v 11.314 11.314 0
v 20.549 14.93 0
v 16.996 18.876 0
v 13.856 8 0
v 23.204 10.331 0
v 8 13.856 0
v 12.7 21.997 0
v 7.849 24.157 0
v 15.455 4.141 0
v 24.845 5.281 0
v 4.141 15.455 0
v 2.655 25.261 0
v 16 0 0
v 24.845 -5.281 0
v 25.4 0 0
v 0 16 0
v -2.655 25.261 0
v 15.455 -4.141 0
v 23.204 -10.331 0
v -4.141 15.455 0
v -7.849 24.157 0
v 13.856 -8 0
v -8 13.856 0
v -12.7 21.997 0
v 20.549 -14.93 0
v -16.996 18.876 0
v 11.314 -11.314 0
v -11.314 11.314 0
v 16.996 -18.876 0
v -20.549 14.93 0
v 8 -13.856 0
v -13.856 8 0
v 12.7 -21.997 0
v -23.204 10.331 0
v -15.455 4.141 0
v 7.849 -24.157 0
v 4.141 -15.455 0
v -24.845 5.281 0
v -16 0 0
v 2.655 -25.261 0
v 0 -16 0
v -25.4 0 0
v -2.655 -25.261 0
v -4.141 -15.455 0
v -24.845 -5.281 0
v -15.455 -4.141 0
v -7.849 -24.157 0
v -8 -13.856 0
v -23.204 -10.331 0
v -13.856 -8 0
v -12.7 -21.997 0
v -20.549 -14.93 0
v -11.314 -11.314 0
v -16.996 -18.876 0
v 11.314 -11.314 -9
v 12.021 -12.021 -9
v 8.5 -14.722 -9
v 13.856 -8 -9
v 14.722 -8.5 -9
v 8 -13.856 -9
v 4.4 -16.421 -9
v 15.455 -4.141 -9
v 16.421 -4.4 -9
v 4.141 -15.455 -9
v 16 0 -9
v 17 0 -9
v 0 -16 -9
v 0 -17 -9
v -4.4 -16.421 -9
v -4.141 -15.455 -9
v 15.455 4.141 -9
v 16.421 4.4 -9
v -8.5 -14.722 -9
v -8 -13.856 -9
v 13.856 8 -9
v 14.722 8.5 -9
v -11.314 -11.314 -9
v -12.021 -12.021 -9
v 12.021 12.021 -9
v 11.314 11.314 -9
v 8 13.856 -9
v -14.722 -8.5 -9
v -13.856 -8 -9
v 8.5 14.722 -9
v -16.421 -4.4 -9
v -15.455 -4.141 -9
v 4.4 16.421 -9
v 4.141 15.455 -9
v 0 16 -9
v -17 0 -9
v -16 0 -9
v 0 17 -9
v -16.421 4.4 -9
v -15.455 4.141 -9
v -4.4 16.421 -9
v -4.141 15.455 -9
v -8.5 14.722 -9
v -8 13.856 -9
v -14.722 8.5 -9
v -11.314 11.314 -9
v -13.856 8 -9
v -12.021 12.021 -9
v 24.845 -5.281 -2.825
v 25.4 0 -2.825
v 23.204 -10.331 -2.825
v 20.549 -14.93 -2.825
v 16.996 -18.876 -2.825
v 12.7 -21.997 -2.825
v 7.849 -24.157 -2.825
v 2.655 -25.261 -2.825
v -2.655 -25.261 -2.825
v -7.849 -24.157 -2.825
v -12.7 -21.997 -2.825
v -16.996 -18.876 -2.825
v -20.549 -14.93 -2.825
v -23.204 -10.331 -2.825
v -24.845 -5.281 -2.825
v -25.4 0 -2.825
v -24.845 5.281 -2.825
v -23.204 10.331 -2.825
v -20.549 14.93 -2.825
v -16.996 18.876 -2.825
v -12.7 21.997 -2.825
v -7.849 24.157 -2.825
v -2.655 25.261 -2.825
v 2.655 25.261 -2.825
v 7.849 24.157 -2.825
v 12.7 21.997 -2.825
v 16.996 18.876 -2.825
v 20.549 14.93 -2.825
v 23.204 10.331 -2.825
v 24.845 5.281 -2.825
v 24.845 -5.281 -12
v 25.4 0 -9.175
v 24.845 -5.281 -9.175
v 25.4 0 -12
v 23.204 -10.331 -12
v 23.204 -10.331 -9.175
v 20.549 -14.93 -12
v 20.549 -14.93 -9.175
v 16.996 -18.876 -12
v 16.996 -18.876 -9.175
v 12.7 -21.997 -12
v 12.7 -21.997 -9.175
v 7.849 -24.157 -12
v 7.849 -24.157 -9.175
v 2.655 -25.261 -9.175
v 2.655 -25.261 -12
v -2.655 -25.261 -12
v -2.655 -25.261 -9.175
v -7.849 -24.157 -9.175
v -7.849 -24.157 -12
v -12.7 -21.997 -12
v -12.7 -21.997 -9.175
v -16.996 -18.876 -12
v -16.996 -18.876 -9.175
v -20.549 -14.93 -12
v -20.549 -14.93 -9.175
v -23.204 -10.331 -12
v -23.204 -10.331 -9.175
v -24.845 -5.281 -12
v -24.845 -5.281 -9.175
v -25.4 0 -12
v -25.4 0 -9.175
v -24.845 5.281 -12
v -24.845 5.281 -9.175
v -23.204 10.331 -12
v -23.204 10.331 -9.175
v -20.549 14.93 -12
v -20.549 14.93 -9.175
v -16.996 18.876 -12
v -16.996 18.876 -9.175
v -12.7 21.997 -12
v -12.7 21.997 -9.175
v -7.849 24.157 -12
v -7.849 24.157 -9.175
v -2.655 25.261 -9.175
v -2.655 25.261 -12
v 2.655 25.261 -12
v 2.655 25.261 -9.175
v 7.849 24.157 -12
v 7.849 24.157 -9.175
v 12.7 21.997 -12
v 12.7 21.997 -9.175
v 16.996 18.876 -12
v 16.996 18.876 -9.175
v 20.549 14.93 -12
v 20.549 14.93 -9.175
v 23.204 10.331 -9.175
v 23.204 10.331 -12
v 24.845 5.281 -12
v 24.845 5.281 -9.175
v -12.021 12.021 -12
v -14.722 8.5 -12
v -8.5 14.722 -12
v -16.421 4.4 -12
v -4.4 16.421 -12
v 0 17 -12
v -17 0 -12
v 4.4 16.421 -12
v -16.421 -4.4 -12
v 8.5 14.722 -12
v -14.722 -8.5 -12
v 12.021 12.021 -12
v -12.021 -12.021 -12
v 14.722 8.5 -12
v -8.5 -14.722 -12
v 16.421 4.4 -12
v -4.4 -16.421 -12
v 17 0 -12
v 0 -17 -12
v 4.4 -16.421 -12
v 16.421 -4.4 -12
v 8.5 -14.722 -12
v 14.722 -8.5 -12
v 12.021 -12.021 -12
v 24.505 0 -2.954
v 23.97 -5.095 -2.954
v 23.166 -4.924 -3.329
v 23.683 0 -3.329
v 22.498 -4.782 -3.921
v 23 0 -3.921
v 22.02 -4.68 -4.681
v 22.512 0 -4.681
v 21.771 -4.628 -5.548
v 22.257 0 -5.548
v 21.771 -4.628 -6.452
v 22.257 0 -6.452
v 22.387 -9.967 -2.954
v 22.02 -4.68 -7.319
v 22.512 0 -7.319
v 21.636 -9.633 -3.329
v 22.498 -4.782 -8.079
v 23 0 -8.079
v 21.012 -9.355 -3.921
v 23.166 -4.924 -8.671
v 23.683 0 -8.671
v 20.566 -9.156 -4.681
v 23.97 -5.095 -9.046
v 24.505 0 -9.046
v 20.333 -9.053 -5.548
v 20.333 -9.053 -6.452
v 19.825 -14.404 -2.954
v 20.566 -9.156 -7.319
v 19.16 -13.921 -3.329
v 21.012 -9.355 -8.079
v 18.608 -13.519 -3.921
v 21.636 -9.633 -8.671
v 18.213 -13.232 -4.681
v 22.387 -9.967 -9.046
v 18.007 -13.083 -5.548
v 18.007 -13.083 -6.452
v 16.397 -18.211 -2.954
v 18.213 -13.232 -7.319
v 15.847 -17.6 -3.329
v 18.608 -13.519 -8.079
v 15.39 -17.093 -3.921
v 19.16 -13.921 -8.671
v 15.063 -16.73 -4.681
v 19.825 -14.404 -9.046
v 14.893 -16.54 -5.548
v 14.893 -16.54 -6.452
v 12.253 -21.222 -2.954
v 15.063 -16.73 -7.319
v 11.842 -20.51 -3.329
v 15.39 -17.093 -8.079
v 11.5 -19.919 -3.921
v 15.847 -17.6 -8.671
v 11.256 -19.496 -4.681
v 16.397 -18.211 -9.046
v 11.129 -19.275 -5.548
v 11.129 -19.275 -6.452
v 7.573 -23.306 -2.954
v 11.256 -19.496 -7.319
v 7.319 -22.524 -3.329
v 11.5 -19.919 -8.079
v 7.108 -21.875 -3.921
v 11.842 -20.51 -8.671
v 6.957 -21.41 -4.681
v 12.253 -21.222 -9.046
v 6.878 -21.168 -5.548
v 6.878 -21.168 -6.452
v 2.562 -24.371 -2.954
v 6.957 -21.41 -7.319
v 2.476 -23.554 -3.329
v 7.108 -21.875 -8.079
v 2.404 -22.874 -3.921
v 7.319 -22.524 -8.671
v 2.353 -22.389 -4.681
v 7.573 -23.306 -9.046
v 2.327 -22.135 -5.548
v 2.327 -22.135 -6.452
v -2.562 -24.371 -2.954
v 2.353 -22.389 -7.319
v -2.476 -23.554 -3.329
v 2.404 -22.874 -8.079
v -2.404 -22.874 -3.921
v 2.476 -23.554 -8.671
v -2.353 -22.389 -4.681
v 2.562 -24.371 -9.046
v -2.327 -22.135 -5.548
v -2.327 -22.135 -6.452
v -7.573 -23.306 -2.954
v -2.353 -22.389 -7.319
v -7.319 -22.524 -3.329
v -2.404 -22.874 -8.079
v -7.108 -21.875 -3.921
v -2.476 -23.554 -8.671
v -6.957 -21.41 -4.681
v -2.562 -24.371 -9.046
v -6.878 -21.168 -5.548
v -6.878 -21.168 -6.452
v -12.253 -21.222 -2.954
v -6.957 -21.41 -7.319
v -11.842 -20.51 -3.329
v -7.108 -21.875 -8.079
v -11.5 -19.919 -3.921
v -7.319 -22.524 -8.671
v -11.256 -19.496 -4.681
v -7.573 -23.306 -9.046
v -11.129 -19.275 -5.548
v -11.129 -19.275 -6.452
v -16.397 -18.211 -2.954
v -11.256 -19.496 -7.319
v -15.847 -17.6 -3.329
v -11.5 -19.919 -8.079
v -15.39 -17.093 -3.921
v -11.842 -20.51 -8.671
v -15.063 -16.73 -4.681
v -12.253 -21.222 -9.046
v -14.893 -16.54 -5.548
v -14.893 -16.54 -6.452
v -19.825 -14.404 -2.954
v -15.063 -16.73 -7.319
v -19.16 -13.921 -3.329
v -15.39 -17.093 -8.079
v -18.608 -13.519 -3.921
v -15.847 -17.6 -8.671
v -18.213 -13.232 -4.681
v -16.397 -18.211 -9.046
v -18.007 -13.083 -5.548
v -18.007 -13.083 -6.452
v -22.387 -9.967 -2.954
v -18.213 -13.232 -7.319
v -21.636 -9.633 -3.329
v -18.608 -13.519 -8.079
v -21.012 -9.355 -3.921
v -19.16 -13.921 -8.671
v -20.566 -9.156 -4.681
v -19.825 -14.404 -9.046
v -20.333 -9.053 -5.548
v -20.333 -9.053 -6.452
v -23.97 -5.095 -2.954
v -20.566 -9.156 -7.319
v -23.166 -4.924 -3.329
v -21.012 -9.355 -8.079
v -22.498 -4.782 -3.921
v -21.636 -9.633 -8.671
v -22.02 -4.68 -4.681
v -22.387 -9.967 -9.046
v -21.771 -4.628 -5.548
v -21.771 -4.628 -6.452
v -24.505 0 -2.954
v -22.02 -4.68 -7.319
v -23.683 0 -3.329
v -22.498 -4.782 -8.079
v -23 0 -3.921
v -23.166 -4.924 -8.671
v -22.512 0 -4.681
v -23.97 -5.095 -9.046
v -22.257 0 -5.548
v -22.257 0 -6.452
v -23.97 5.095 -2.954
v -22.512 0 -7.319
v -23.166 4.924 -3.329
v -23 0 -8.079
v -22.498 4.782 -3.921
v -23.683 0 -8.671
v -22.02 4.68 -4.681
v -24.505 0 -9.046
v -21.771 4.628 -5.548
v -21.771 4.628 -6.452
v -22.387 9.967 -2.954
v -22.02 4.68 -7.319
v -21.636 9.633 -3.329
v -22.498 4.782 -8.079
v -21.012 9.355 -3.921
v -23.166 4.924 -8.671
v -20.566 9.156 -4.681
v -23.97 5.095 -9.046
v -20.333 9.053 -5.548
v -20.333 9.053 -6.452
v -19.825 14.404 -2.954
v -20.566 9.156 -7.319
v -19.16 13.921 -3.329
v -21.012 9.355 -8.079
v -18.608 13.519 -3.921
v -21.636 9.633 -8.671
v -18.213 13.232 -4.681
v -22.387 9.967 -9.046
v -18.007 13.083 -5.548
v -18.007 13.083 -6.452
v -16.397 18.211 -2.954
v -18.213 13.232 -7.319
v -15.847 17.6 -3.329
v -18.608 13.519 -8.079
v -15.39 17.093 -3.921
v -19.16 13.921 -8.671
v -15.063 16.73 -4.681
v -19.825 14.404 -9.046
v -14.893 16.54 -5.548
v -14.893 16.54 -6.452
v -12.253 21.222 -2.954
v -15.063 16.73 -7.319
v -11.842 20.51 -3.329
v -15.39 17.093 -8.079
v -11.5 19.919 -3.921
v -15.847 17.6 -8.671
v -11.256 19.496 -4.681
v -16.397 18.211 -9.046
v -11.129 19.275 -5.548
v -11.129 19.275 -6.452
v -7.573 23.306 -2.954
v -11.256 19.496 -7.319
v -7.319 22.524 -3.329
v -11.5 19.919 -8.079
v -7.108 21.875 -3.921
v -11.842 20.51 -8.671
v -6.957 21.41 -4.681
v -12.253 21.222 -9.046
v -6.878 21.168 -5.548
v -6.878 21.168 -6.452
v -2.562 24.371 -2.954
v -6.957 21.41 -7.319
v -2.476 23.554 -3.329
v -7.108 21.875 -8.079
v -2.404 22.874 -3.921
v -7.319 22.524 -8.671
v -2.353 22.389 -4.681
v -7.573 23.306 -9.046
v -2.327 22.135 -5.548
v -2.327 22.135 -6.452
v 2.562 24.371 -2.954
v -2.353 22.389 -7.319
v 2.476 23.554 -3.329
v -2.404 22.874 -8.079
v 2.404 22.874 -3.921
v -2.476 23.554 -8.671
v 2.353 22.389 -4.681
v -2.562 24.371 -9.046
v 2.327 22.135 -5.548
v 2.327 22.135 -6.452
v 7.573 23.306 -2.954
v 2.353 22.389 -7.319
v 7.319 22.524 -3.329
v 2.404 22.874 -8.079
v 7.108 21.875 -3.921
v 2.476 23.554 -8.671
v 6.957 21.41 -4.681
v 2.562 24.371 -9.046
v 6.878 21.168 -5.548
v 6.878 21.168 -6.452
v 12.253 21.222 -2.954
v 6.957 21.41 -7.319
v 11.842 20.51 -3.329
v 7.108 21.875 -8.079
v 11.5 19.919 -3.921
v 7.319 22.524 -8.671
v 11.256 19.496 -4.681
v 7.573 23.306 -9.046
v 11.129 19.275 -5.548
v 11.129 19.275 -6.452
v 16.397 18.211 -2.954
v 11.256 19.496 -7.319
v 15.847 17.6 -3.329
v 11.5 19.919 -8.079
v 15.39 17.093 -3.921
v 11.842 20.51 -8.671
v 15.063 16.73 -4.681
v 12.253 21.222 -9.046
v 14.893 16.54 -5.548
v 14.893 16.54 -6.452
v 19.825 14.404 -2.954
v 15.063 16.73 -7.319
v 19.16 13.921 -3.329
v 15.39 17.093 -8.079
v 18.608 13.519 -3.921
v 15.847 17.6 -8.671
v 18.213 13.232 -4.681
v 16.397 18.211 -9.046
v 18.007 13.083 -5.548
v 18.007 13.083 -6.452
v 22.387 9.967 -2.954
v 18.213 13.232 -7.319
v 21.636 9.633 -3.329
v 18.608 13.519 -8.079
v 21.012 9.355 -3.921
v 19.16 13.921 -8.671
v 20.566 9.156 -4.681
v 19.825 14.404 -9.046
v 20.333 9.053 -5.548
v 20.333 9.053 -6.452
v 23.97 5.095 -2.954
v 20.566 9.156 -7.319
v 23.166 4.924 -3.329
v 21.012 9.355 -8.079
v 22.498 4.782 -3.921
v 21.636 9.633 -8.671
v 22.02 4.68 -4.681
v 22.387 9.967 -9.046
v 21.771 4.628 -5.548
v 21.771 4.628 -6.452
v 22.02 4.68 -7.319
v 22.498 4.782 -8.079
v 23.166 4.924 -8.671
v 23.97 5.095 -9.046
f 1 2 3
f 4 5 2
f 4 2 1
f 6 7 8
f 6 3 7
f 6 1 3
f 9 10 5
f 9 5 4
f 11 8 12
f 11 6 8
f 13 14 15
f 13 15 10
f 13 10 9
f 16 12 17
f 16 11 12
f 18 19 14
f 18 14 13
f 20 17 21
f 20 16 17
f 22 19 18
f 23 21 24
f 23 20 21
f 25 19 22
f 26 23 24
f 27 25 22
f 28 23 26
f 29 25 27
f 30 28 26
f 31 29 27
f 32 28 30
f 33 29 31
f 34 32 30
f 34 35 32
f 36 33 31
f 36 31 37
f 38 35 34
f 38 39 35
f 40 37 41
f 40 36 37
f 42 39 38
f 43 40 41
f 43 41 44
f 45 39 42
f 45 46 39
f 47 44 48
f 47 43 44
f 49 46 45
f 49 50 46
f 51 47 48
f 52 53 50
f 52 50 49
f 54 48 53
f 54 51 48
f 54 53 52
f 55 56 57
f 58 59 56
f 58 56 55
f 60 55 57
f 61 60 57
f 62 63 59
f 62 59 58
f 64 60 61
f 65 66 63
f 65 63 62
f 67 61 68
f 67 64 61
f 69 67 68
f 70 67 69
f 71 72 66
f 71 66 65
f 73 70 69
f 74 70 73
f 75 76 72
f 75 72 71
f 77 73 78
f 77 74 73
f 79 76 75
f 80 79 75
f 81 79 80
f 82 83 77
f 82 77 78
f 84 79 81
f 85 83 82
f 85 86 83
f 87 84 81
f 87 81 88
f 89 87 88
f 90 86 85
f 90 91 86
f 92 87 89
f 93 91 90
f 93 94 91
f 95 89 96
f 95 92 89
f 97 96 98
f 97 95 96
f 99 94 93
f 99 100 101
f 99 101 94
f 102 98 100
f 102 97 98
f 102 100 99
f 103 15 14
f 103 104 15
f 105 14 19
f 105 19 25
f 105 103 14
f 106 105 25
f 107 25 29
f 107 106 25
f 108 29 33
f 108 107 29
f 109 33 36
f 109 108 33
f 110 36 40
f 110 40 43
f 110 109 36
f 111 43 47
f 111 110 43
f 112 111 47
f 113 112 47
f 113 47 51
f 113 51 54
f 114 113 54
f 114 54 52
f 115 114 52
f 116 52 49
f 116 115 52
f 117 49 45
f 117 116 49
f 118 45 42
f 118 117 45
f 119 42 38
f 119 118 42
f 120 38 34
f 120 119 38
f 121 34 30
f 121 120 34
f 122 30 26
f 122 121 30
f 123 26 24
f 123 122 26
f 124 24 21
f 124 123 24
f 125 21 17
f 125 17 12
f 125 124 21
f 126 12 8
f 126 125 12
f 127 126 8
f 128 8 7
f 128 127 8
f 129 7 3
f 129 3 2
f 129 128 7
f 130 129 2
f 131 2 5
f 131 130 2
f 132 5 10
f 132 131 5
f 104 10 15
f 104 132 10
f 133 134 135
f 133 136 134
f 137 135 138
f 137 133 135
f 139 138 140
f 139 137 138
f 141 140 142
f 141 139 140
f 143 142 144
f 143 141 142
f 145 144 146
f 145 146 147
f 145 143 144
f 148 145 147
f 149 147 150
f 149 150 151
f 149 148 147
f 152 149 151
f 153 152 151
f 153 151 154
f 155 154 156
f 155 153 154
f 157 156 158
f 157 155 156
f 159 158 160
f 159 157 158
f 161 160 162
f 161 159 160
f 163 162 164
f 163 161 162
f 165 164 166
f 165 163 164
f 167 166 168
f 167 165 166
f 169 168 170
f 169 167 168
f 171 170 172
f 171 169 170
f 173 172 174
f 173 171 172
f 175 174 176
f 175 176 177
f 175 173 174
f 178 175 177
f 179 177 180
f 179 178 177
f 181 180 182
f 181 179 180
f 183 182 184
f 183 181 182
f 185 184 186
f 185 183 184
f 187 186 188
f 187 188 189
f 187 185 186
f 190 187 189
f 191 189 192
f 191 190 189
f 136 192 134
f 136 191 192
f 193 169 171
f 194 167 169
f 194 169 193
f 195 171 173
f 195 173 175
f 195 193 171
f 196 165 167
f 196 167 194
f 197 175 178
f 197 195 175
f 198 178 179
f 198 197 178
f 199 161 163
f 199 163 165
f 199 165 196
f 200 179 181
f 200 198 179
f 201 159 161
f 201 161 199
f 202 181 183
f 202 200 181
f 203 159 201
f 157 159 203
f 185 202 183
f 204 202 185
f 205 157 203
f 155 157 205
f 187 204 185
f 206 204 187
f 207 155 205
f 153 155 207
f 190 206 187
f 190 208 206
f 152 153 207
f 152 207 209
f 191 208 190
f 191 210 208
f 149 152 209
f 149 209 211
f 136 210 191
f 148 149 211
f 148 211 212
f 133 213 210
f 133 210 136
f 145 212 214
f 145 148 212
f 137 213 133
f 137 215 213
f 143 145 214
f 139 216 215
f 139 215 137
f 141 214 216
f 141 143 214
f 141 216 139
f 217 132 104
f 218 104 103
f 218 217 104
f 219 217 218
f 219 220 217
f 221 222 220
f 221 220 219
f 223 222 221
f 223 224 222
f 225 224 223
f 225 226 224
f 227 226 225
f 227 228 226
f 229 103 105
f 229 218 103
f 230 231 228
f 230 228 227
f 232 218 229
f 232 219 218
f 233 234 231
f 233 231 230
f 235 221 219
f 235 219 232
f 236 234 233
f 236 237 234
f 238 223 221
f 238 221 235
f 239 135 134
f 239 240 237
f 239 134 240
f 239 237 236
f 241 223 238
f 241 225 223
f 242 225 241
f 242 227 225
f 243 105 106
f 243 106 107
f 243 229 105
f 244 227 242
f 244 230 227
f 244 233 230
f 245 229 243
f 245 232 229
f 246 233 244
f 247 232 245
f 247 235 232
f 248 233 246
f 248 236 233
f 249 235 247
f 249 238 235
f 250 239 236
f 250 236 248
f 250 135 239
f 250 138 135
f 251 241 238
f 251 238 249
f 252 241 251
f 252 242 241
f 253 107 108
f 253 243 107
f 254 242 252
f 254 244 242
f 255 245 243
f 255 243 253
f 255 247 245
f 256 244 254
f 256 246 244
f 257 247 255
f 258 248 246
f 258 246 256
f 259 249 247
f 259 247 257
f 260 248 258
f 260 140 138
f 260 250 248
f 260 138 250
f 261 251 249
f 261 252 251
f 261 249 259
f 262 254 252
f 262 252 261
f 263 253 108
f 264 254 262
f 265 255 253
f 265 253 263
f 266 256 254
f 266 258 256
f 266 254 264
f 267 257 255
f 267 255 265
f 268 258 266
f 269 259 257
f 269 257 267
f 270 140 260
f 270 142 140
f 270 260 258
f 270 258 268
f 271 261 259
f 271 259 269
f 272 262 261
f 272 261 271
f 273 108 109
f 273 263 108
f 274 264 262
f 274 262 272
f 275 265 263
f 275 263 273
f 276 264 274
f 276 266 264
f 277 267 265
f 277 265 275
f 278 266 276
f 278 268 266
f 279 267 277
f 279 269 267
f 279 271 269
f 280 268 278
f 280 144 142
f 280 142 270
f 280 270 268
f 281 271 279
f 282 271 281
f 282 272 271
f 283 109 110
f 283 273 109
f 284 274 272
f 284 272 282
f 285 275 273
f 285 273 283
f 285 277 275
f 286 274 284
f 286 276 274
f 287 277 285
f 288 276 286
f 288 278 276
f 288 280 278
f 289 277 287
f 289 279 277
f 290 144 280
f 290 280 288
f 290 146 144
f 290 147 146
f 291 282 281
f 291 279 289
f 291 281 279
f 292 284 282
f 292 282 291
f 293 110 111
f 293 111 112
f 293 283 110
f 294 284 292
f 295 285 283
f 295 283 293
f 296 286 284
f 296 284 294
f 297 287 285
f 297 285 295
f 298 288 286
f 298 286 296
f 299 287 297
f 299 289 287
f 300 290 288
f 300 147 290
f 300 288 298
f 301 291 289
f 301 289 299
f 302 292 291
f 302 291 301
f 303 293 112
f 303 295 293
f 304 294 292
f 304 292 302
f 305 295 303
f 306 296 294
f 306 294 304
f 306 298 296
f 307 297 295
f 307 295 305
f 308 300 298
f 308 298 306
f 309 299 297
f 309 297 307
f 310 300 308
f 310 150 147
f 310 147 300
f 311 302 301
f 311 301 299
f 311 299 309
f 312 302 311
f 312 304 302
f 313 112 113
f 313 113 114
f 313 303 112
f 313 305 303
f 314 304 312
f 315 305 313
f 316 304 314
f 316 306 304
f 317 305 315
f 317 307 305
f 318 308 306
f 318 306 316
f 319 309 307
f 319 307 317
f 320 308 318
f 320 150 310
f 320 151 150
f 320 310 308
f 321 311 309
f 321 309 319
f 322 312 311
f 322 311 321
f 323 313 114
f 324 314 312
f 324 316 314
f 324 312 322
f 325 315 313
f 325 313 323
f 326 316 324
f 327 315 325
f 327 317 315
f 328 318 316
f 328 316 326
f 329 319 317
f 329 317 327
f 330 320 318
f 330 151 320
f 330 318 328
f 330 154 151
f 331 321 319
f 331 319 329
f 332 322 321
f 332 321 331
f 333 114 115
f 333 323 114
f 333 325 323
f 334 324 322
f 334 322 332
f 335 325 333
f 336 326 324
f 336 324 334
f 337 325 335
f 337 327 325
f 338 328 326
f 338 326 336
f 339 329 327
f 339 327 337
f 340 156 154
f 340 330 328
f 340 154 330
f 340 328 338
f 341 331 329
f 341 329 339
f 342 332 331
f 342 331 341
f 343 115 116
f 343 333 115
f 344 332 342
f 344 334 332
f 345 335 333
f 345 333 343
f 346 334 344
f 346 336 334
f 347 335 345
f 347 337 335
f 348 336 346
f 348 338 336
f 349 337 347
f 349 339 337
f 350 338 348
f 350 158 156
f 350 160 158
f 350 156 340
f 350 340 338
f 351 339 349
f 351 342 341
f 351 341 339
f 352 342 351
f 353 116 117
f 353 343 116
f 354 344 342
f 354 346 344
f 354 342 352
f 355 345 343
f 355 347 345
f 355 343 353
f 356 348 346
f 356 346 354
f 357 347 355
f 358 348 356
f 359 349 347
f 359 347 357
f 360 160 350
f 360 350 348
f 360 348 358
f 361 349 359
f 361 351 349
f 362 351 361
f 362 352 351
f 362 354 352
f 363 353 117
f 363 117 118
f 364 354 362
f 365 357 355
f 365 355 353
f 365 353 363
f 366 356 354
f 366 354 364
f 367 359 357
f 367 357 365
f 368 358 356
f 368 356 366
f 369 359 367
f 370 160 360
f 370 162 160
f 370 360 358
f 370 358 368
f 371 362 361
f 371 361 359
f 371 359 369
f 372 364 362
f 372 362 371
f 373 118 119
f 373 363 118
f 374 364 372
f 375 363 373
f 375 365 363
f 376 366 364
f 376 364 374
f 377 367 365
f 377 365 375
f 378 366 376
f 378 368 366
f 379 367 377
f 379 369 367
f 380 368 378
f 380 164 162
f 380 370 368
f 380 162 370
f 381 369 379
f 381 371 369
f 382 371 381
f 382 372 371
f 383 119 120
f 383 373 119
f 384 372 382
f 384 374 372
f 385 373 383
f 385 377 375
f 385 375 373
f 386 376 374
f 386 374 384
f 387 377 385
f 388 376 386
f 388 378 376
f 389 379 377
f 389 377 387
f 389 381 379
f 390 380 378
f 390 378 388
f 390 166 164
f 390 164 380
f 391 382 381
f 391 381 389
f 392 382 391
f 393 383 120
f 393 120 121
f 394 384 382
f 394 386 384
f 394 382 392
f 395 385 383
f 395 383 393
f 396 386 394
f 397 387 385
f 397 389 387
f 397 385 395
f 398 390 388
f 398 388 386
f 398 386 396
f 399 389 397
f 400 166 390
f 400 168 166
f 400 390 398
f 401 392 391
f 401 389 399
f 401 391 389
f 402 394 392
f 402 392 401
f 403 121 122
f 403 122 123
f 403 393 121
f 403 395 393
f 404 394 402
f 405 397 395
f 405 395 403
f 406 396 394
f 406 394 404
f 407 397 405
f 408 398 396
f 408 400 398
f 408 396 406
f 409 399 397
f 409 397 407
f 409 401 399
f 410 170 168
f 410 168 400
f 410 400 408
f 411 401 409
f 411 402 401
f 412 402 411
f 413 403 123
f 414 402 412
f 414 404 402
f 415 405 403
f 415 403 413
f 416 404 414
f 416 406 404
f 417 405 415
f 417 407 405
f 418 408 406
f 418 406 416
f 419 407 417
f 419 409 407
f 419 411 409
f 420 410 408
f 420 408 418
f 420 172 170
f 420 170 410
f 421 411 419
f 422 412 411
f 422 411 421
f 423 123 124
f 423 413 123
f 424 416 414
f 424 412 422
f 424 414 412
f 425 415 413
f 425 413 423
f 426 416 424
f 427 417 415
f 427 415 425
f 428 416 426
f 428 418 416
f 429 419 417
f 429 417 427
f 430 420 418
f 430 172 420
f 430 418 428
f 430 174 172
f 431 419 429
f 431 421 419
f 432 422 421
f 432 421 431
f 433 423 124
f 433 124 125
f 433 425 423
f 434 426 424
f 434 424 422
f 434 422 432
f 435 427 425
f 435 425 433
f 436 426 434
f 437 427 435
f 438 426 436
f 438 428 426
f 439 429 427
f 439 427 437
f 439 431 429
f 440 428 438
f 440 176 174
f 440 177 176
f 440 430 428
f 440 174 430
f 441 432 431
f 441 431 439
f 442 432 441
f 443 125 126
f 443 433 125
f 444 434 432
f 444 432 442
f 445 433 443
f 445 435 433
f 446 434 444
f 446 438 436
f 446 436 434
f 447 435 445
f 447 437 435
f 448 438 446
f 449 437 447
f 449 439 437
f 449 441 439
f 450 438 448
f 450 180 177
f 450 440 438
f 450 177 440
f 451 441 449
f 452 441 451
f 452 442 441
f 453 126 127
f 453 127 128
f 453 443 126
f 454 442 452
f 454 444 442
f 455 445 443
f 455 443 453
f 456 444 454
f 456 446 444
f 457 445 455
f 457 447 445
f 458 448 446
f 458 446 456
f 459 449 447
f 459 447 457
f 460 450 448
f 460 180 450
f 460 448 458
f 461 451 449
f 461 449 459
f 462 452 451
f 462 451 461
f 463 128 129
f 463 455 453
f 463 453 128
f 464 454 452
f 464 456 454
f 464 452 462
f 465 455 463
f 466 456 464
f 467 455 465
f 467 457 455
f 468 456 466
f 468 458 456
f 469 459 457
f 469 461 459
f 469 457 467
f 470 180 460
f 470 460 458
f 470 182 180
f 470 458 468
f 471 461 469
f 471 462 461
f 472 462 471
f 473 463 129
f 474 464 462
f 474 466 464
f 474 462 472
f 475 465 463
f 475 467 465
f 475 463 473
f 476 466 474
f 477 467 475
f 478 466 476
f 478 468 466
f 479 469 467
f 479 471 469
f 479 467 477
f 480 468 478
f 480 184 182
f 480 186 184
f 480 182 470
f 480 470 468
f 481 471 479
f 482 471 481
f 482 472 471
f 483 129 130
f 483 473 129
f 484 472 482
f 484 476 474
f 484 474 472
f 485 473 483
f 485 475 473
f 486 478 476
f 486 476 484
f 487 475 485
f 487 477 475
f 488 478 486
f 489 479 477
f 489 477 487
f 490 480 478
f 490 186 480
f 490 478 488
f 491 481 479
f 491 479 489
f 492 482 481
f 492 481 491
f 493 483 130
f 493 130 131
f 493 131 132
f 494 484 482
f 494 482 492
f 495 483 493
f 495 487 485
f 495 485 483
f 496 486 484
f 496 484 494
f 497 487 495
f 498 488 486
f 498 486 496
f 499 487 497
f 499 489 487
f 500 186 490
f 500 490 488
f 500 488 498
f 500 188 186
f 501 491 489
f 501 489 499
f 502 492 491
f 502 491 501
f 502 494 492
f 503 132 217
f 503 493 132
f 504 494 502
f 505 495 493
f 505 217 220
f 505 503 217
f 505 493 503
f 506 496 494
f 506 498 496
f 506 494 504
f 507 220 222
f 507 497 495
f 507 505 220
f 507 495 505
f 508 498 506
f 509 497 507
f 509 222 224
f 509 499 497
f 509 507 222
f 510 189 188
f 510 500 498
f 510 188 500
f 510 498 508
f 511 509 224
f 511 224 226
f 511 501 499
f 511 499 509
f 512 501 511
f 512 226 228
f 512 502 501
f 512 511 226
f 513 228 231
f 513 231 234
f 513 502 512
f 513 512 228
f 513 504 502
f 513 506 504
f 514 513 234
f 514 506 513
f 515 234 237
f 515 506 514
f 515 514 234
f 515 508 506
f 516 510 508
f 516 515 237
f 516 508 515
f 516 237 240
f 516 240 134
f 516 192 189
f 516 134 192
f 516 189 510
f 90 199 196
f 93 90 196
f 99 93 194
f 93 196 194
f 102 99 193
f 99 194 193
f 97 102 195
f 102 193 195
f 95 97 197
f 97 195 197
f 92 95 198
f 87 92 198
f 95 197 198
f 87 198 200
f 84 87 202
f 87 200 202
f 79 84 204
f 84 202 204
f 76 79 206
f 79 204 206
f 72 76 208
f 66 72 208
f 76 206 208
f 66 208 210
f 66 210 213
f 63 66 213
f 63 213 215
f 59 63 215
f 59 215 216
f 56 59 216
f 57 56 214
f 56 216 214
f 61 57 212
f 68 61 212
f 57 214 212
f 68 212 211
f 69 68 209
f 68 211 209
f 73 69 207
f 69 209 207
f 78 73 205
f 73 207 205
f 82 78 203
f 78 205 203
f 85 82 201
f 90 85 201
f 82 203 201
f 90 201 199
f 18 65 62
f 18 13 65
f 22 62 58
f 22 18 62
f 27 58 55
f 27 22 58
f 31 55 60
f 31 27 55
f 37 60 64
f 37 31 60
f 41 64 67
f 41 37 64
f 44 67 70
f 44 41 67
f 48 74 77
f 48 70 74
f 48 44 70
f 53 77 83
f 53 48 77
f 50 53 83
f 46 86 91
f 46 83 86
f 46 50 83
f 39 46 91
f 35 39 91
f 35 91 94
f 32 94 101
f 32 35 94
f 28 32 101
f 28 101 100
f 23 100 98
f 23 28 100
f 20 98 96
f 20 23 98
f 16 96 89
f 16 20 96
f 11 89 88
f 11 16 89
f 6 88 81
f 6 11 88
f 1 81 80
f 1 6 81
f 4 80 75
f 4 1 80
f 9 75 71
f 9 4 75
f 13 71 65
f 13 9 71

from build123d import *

# Parameters (mm, degrees)
SKETCH2_R          = 17
CUT_EXTRUDE1_DEPTH = 3


with BuildPart() as part:
    # Sketch1 → Revolve1 (revolve)
    with BuildSketch(Plane(origin=(0, 0, 0), x_dir=(1, 0, 0), z_dir=(0, 1, 0))):
        with BuildLine():
            Line((16, 0), (25.4, 0))
            Line((25.4, 0), (25.4, 2.825))
            ThreePointArc((25.4, 2.825), (22.225, 6), (25.4, 9.175))
            Line((25.4, 9.175), (25.4, 12))
            Line((25.4, 12), (16, 12))
            Line((16, 12), (16, 0))
        make_face()
    revolve(axis=Axis((0, 0, 0), (0, 0, -1)))

    # Sketch2 → Cut-Extrude1 (cut)
    with BuildSketch(Plane(origin=(0, 0, -12), x_dir=(-1, 0, 0), z_dir=(0, 0, -1))):
        Circle(SKETCH2_R)
    extrude(amount=-CUT_EXTRUDE1_DEPTH, mode=Mode.SUBTRACT)


solid = part.part
